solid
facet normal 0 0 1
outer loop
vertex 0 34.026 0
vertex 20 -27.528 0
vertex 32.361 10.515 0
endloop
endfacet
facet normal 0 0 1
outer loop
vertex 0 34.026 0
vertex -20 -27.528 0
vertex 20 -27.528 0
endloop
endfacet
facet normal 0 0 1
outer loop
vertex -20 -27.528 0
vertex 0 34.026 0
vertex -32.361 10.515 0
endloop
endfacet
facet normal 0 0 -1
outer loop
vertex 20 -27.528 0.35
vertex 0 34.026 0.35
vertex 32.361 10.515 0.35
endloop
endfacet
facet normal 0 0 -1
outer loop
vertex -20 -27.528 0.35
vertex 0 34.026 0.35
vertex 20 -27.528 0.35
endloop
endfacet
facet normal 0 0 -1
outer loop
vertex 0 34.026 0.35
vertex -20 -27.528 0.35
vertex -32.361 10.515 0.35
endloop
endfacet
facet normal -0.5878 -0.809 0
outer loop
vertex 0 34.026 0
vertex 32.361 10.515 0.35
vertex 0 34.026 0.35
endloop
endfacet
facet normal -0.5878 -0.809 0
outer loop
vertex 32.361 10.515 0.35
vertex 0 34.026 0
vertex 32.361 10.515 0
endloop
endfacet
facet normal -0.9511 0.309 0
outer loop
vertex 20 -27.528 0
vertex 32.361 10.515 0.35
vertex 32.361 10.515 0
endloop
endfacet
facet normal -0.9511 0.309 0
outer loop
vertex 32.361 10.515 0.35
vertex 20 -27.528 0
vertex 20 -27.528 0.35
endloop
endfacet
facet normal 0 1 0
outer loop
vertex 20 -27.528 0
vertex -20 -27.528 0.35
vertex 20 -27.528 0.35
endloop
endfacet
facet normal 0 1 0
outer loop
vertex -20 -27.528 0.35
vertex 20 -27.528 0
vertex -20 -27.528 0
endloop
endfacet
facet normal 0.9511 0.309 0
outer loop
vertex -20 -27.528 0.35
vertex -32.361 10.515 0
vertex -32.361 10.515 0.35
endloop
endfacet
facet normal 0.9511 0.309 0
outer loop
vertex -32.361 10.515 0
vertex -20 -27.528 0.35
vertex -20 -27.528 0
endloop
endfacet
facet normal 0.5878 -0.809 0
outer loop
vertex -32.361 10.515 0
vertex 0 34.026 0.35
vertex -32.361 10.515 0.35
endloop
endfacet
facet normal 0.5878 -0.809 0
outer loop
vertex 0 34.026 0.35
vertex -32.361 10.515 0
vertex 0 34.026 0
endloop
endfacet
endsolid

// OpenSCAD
// Regular Polygonal Tiles v.01
// (C) @oblomobka - 2023.03
// GPL license

phi = (1+sqrt(5))/2; // Golden ratio = 1,618...

module RegularTiles (Polygon = 3, side = 20, h = 1, Bevel = 1){
    

    }
    
module TriangleTile (side = 40, h = 0.35, Bevel =1){
    
    a = (side * 0.5) / cos (30);
    // Definition of points and faces
    Tpoints=[
        [ 0, a, 0], [ a * +cos(30), -a * sin(30), 0], [ -a * cos(30), -a * sin(30), 0],
        [ 0, a, h], [ a * +cos(30), -a * sin(30), h], [ -a * cos(30), -a * sin(30), h],
        ];
       
    Tfaces=[
        [ 0, 1, 2], [ 3, 5, 4],                         // Floor & Roof                                             
        [ 0, 3, 4, 1], [ 1, 4, 5, 2], [ 2, 5, 3, 0]     // Walls        
    ];
    
    polyhedron(Tpoints,Tfaces);
}

module SquareTile (side = 40, h = 0.35, Bevel =1){
    
    a = side * 0.5 ;
    
    // Definition of points and faces
    Sqpoints=[
        [ +a, +a, 0], [ +a, -a, 0], [ -a, +a, 0], [ -a, -a, 0],
        [ +a, +a, h], [ +a, -a, h], [ -a, +a, h], [ -a, -a, h]
        ];
       
    Sqfaces=[
        [ 0, 2, 3, 1], [ 4, 5, 7, 6],   // Floor & Roof
        // Walls
        [ 0, 4, 5, 1], [ 1, 5, 7, 3],
        [ 3, 7, 6, 2], [ 2, 6, 4, 0]
    ];
    
    polyhedron(Sqpoints,Sqfaces);
}

module PentagonTile (side = 40, h = 0.35, Bevel =1){
    
    a = (side * 0.5) / cos (54);
    
    // Definition of points and faces
    Ppoints=[
        // Floor points
        [ 0, a, 0],
        [a * +cos (18), a * +sin (18), 0], [a * -cos (18), a * +sin (18), 0],
        [a * +sin (36), a * -cos (36), 0], [a * -sin (36), a * -cos (36), 0],
    
        // Roof points
        [ 0, a, h],
        [a * +cos (18), a * +sin (18), h], [a * -cos (18), a * +sin (18), h],
        [a * +sin (36), a * -cos (36), h], [a * -sin (36), a * -cos (36), h],
        ];
       
    Pfaces=[
        [ 0, 1, 3, 4, 2], [ 5, 7, 9, 8, 6],          // Floor & Roof
        // Walls
        [ 0, 5, 6, 1], [ 1, 6, 8, 3],
        [ 3, 8, 9, 4], [ 4, 9, 7, 2 ],
        [ 2, 7, 5, 0]
        ];
    
    polyhedron(Ppoints,Pfaces);
}

module HexagonTile (side = 40, h = 0.35, Bevel =1){
    
    a = side;
    
    // Definition of points and faces
    Ppoints=[
        // Floor points
        [ +a, 0, 0], [ -a, 0, 0],
        [ +a * cos (60), +a * sin (60), 0], [ -a * cos (60), +a * sin (60), 0],
        [ +a * cos (60), -a * sin (60), 0], [ -a * cos (60), -a * sin (60), 0],
    
        // Roof points
        [ +a, 0, h], [ -a, 0, h],
        [ +a * cos (60), +a * sin (60), h], [ -a * cos (60), +a * sin (60), h],
        [ +a * cos (60), -a * sin (60), h], [ -a * cos (60), -a * sin (60), h],
        ];
       
    Pfaces=[
        [ 0, 4, 5, 1, 3, 2], [ 6, 8, 9, 7, 11, 10],          // Floor & Roof
        // Walls
        [  0,  6, 10,  4], [  4, 10, 11,  5], [  5, 11,  7,  1],
        [  1,  7,  9,  3], [  3,  9,  8,  2], [  2,  8,  6,  0]
        ];
    
    polyhedron(Ppoints,Pfaces);
}


PentagonTile();
